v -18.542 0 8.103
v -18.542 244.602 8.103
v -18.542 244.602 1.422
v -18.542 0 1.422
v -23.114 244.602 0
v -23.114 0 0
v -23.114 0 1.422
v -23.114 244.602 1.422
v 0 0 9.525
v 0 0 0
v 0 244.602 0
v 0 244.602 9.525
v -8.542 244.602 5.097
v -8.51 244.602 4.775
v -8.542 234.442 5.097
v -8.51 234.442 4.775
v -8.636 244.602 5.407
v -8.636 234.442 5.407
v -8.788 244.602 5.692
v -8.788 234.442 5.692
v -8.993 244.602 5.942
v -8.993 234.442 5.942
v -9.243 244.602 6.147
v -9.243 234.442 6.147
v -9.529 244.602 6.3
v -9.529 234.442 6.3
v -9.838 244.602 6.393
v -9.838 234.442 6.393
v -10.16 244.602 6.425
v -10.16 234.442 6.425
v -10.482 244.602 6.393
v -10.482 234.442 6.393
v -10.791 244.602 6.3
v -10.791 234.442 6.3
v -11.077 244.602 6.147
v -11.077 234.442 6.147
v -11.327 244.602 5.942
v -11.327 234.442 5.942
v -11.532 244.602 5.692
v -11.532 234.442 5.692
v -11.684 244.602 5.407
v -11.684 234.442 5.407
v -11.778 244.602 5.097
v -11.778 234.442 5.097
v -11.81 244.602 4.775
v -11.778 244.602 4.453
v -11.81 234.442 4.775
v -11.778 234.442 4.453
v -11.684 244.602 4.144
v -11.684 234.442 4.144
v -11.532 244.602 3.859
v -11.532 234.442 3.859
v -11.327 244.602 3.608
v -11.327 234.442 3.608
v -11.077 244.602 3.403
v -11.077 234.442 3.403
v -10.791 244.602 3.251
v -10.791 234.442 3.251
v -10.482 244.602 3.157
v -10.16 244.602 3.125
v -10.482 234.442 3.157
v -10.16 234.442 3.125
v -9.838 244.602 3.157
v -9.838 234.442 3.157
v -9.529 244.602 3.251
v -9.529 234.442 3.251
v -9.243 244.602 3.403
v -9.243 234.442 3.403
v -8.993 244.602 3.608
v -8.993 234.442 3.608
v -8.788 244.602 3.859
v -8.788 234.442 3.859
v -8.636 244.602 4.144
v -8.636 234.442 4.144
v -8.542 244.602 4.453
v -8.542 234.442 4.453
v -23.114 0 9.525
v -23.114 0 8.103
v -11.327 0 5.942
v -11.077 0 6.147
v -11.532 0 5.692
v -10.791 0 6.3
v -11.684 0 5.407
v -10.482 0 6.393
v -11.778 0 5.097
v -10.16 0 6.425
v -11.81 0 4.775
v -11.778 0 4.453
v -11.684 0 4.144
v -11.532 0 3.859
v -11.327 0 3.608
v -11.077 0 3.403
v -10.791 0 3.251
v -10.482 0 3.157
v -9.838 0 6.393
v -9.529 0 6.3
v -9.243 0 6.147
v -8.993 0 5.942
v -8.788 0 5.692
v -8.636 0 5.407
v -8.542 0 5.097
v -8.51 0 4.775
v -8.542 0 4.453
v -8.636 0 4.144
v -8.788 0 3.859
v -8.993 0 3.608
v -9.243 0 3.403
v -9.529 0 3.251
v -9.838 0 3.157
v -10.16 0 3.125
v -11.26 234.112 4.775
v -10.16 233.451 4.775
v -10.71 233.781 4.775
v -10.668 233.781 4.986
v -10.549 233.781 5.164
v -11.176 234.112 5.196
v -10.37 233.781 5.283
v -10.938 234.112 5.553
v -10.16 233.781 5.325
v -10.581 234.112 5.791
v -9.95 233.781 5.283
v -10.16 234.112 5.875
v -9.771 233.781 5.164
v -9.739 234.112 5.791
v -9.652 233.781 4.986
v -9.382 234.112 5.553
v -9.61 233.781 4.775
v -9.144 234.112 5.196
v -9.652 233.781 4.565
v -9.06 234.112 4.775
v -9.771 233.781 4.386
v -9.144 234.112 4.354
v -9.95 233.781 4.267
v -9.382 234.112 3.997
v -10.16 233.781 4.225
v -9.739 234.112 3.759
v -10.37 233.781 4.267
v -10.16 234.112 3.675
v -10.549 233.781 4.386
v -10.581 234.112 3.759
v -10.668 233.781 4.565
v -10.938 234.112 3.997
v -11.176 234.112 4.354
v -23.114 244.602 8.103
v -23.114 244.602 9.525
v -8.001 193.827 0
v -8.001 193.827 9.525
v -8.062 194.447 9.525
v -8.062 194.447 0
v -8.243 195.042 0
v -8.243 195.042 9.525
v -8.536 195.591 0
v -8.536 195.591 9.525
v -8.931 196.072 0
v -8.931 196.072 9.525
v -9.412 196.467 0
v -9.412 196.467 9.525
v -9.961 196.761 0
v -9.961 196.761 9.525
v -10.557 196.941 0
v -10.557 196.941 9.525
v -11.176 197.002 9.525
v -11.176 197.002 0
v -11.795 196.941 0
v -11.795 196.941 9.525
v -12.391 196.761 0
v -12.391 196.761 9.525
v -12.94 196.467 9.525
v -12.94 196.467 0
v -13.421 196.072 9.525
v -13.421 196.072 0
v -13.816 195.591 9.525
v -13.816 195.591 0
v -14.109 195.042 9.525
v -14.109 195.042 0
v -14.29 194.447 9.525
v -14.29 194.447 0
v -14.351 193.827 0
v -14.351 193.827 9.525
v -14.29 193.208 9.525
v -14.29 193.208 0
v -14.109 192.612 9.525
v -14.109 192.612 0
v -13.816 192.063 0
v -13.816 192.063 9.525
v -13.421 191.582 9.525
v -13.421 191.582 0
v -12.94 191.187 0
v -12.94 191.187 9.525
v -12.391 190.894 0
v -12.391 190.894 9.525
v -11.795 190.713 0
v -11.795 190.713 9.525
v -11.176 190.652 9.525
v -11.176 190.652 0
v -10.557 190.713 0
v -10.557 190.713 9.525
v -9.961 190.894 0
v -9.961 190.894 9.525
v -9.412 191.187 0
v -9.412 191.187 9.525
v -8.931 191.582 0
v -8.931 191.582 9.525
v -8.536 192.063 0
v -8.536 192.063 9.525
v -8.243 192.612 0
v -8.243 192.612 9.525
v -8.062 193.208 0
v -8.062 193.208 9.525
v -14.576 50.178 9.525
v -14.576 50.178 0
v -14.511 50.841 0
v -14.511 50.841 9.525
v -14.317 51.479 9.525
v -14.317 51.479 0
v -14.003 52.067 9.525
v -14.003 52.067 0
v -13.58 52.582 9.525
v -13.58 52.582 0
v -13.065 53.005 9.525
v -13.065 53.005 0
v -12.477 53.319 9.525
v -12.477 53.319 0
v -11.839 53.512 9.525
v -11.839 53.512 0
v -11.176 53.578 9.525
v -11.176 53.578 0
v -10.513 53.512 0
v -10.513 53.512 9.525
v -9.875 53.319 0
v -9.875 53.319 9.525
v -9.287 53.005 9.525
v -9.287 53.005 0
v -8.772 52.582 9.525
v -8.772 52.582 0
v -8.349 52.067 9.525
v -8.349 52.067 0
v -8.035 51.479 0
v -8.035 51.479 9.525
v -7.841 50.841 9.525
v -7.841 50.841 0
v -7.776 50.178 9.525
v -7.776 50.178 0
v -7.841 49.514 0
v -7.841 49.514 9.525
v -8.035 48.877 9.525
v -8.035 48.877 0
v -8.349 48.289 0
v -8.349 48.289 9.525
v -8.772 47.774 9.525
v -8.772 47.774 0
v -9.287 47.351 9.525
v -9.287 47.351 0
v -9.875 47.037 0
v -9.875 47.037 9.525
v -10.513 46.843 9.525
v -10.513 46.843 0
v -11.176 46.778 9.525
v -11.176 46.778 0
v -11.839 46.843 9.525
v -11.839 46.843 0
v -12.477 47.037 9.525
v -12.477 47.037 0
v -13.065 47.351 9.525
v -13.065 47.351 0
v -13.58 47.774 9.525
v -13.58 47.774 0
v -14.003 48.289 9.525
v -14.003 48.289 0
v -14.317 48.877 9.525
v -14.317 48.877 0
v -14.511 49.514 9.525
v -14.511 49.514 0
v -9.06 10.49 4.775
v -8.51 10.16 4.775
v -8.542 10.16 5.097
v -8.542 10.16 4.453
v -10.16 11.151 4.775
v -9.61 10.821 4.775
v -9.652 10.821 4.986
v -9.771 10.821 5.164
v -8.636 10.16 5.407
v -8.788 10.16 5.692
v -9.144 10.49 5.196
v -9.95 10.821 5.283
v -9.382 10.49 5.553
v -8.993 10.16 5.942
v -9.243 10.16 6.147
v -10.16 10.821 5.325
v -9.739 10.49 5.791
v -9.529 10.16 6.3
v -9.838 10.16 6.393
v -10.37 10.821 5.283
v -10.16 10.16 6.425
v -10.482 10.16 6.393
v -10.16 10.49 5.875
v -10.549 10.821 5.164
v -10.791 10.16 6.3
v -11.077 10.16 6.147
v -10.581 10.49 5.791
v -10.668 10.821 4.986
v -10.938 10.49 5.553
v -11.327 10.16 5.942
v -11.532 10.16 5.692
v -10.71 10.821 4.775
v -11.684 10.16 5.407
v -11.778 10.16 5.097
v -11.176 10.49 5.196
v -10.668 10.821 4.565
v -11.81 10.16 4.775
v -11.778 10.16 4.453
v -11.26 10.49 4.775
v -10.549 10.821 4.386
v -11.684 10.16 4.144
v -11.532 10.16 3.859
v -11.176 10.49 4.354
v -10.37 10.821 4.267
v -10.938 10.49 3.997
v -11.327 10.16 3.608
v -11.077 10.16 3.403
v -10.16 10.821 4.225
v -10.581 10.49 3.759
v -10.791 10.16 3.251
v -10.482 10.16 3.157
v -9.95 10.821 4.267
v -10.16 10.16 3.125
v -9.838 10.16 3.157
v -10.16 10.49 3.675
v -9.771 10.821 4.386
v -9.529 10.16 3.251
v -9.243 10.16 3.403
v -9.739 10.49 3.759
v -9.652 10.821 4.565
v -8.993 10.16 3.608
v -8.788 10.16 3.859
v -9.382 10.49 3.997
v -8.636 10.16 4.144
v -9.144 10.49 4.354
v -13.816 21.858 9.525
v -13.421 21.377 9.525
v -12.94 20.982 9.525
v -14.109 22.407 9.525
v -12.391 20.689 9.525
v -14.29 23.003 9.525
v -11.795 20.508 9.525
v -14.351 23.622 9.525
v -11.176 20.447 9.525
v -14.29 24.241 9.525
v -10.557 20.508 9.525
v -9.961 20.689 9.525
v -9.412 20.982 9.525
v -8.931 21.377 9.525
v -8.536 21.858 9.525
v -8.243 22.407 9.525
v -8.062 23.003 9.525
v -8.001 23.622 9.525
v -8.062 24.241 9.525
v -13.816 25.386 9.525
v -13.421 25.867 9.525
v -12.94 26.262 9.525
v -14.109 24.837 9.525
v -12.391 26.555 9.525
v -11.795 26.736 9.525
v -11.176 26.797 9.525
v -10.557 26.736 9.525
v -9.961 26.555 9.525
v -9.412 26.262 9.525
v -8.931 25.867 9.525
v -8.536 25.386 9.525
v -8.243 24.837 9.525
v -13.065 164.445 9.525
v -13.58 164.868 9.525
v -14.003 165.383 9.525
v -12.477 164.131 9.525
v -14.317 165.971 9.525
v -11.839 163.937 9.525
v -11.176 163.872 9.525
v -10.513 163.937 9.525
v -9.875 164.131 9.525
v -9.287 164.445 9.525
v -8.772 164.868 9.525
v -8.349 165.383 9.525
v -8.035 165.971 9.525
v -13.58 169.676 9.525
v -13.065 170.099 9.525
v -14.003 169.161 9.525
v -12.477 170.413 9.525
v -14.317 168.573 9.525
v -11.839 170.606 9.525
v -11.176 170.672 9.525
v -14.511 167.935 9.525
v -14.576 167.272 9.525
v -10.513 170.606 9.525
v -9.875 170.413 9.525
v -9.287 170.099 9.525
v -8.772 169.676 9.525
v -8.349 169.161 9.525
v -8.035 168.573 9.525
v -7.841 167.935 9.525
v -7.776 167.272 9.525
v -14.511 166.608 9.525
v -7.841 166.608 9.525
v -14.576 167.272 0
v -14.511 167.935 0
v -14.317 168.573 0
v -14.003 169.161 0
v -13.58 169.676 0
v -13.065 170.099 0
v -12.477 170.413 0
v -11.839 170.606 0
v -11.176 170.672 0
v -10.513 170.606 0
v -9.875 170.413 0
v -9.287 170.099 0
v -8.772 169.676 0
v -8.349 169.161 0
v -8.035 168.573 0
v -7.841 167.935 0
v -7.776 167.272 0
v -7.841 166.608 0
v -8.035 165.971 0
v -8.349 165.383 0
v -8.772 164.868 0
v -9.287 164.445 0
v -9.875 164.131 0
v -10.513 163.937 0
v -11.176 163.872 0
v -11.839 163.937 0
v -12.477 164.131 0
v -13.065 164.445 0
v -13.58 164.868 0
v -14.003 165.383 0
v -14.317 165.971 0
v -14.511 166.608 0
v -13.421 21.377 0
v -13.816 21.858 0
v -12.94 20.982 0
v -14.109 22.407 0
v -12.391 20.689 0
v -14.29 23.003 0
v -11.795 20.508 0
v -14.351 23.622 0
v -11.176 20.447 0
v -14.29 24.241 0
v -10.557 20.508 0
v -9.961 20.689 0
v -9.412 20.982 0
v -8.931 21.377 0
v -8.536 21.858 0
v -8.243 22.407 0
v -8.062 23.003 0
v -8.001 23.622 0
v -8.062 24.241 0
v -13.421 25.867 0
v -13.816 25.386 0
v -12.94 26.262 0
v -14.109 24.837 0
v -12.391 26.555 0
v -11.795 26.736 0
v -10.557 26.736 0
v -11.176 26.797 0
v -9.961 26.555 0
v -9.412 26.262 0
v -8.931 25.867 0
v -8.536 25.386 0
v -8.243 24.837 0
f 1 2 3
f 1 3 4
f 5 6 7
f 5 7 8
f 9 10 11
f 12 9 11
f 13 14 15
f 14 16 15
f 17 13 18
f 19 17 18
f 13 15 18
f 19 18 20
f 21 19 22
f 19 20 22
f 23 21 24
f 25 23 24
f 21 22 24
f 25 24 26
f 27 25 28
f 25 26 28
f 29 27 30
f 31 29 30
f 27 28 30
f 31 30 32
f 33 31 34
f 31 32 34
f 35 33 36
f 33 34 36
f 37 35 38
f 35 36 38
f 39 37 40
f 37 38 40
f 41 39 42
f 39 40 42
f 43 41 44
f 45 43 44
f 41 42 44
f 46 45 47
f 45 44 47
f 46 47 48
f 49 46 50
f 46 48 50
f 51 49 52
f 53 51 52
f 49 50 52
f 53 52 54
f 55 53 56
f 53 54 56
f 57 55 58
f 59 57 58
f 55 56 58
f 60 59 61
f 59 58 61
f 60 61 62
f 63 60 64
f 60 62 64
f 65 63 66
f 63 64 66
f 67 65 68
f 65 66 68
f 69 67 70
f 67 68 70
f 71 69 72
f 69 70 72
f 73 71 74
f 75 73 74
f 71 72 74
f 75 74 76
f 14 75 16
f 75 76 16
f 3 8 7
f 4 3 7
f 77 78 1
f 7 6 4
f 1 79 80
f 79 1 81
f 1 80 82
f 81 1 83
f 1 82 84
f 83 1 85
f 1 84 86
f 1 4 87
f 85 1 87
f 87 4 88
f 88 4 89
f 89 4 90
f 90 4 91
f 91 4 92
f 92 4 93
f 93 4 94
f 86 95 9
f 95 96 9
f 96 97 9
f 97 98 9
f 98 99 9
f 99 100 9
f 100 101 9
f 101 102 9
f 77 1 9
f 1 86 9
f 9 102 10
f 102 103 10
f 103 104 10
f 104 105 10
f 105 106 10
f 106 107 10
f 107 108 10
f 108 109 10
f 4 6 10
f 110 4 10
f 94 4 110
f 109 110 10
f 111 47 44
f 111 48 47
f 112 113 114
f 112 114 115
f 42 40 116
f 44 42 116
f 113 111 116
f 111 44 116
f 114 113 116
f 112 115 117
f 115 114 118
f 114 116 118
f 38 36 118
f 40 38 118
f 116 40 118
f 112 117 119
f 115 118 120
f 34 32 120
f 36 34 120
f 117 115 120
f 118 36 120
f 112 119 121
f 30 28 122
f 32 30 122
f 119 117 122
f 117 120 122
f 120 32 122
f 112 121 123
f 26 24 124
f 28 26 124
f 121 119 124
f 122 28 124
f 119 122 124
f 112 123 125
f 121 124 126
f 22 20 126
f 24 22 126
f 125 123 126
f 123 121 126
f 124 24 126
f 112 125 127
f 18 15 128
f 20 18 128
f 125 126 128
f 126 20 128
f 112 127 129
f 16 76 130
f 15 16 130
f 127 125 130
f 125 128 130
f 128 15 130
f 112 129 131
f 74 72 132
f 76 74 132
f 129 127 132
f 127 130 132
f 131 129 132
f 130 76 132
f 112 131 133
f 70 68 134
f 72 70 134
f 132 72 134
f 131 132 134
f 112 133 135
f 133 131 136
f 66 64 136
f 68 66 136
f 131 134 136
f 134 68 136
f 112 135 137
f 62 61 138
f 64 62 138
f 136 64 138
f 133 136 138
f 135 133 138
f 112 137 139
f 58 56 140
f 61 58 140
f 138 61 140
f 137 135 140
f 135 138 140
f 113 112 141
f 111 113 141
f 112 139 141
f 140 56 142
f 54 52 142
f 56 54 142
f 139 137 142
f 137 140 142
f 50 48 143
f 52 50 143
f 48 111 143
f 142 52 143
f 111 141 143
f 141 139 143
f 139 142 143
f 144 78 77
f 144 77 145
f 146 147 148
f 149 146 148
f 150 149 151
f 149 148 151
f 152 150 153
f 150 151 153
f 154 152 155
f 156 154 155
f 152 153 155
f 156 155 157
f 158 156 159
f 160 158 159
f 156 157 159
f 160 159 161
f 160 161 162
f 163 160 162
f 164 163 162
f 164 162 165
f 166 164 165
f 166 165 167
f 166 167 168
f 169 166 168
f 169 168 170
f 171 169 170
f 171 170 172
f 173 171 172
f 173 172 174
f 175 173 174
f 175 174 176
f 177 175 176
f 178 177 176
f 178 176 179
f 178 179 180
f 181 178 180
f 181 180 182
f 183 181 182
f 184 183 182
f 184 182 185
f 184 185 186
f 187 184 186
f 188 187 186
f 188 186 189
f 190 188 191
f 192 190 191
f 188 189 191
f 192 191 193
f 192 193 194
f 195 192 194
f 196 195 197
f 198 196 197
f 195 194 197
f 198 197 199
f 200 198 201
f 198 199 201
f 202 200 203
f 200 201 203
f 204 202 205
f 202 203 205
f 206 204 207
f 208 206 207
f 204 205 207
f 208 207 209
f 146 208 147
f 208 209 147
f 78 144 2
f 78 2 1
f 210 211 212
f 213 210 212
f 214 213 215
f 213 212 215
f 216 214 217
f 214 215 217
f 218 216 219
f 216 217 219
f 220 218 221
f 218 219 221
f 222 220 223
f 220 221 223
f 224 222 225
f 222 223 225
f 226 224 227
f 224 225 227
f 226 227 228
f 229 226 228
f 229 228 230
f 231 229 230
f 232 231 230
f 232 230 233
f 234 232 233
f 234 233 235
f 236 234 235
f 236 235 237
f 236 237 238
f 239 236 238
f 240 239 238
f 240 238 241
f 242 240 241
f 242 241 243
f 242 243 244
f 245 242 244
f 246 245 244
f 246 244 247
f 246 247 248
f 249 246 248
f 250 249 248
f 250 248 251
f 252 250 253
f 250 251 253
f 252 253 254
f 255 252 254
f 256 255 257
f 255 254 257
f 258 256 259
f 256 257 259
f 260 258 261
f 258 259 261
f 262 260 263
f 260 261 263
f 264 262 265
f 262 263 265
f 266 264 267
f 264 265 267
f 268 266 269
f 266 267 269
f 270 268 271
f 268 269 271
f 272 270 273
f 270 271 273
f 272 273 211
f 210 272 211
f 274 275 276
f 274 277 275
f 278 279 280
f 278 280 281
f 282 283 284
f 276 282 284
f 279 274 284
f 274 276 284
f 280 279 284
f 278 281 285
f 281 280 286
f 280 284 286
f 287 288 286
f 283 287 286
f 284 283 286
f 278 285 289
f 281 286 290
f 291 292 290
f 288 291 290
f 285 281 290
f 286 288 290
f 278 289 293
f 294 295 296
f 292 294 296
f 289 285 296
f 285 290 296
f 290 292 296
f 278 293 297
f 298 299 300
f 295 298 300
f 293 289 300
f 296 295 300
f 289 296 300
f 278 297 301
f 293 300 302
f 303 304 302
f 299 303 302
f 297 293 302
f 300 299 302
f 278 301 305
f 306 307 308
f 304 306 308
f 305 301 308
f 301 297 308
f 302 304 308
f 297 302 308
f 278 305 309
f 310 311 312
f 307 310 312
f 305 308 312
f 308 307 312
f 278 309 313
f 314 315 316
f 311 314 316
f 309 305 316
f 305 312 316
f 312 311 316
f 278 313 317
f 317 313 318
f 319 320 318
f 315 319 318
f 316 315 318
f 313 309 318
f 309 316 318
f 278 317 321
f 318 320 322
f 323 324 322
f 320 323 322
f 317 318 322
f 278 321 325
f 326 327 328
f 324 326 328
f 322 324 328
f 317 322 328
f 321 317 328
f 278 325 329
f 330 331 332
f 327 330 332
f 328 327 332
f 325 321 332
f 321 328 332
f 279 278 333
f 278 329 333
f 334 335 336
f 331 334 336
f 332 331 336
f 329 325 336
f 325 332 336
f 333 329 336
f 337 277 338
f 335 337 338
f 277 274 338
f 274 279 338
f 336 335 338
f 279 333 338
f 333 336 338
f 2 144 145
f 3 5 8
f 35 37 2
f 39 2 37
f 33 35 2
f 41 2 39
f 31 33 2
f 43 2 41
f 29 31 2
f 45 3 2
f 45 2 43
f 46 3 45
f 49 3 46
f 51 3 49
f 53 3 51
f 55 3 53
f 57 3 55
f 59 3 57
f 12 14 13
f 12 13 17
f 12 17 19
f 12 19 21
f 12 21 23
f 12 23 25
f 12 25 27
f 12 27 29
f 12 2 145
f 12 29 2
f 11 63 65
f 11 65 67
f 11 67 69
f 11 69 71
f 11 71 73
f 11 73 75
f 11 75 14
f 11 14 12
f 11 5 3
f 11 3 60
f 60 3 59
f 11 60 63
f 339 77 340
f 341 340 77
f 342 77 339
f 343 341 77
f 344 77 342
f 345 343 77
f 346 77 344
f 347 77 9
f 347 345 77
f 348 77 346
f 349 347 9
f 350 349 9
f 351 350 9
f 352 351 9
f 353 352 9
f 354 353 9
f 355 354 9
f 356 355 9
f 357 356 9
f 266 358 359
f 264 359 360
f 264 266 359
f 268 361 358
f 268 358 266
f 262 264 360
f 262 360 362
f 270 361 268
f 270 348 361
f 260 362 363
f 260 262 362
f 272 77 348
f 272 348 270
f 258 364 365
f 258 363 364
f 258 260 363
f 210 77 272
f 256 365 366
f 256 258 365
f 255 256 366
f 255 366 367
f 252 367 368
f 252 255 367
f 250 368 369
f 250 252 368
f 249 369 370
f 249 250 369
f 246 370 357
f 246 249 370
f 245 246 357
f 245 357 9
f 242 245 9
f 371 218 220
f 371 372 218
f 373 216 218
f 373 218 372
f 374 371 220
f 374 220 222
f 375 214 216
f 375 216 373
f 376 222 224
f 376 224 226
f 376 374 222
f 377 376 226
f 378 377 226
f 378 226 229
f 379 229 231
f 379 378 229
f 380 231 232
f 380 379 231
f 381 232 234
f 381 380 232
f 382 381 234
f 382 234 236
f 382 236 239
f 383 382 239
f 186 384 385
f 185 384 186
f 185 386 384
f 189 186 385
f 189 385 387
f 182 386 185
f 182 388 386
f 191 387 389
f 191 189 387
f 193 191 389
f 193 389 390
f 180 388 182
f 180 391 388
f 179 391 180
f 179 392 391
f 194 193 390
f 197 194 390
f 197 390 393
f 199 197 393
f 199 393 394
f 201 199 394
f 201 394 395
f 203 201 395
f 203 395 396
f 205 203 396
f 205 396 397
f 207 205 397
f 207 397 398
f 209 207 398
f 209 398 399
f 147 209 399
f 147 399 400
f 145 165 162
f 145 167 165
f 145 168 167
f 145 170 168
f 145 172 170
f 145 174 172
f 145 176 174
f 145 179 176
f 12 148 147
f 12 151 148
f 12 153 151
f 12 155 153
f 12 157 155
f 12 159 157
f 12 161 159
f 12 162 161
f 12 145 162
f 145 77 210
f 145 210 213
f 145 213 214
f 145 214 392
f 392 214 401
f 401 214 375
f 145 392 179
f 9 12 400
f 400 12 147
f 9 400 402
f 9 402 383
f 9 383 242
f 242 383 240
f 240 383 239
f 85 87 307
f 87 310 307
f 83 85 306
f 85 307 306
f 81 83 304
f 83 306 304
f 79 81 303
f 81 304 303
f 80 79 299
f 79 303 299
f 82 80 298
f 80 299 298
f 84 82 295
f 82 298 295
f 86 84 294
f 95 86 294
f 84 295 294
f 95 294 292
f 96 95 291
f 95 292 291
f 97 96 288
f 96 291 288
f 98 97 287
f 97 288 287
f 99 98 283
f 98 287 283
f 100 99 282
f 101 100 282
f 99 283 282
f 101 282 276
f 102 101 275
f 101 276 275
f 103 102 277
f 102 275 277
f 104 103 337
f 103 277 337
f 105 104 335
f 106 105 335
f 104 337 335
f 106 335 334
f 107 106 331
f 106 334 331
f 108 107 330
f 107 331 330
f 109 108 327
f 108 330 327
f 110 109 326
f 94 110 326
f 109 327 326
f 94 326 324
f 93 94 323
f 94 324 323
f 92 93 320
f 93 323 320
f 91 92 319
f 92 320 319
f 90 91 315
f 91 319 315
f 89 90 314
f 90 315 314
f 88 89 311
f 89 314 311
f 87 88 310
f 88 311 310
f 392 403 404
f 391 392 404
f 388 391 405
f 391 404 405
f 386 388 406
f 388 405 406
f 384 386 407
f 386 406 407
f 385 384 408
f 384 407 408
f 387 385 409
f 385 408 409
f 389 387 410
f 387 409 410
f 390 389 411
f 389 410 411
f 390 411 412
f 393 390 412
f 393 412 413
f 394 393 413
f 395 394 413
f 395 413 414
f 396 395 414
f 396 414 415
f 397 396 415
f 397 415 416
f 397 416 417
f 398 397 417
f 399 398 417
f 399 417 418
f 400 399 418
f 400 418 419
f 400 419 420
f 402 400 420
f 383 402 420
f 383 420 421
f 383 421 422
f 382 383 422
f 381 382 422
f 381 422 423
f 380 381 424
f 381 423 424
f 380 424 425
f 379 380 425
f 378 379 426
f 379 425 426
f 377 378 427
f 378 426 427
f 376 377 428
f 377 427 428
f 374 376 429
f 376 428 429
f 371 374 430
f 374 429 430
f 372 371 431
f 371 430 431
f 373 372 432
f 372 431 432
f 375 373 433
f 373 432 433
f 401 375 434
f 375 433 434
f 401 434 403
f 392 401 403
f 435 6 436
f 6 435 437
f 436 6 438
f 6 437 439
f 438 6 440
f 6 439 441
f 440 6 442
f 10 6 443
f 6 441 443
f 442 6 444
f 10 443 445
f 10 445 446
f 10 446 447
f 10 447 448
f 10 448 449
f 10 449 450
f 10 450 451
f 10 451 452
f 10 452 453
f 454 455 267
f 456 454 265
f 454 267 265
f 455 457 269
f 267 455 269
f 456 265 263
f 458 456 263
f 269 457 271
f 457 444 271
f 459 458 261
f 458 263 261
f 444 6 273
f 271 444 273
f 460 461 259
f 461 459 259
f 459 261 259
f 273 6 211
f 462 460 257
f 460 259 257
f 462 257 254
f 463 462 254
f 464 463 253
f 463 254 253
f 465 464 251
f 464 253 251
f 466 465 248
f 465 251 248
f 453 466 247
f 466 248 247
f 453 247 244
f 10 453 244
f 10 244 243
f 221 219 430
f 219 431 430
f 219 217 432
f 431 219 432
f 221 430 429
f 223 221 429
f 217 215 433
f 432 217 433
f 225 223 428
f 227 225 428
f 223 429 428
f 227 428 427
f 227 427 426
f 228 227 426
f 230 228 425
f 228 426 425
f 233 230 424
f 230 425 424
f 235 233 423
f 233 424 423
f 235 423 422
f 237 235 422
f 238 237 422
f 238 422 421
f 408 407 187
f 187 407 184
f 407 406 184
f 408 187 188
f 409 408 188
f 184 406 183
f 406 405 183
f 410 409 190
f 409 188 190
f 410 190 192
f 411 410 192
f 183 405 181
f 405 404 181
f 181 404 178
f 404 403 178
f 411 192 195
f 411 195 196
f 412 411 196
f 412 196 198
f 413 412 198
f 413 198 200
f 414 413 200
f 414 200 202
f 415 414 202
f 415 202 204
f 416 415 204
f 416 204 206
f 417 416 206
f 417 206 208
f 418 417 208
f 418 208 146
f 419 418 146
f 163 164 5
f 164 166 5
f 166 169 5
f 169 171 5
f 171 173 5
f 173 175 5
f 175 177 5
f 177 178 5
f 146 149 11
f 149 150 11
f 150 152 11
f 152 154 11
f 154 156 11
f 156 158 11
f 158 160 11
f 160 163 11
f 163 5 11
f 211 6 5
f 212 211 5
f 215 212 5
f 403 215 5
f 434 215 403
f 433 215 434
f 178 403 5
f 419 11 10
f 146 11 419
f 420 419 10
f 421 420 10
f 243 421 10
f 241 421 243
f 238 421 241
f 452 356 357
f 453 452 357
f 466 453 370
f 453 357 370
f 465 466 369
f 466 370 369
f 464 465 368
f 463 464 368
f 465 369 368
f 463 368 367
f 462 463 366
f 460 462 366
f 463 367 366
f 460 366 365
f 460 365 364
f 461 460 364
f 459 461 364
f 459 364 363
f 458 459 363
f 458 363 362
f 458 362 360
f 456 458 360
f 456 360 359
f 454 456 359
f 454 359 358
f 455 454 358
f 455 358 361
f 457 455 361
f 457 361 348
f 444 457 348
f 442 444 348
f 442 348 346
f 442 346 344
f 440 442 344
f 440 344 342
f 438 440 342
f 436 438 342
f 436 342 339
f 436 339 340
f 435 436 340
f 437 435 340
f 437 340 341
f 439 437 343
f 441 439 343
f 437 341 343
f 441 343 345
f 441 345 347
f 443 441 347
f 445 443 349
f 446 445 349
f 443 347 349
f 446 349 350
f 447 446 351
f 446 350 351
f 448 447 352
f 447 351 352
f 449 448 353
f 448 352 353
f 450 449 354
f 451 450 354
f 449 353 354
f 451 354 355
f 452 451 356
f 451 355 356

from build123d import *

# Parameters (mm, degrees)
F0_W     = 23.114
F0_H     = 244.602
F1_DEPTH = 9.525
F2_W     = 244.602
F2_H     = 6.6802
F3_DEPTH = 4.572
F4_R     = 3.175
F5_DEPTH = 9.526
F8_D     = 3.3
F8_DEPTH = 10.16
F8_TIP   = 0.9914200214
F9_D     = 3.3
F9_DEPTH = 10.16
F9_TIP   = 0.9914200214
F11_D    = 6.8


with BuildPart() as f1:
    # F0 (on Top) → F1 (new body)
    with BuildSketch(Plane.XY):
        with Locations((-11.557, 122.301)):
            Rectangle(F0_W, F0_H)
    extrude(amount=F1_DEPTH)

    # F2 (on face) → F3 (cut)
    with BuildSketch(Plane(origin=(-23.114, 0, 0), x_dir=(0, -1, 0), z_dir=(-1, 0, 0))):
        with Locations((-122.301, 4.7625)):
            Rectangle(F2_W, F2_H)
    extrude(amount=-F3_DEPTH, mode=Mode.SUBTRACT)

    # F4 (on face) → F5 (cut, through all)
    with BuildSketch(Plane.XY.offset(9.525)):
        with Locations((-11.176, 23.622)):
            Circle(F4_R)
        with Locations((-11.176, 193.8274)):
            Circle(F4_R)
    extrude(amount=-F5_DEPTH, mode=Mode.SUBTRACT)

    # F8
    with Locations(Plane(origin=(0, 244.602, 0), x_dir=(-1, 0, 0), z_dir=(0, 1, 0))):
        with Locations((10.16, 4.7752)):
            Hole(F8_D / 2, depth=F8_DEPTH)
            with Locations((0, 0, -(F8_DEPTH + F8_TIP / 2))):  # 118° drill point
                Cone(0, F8_D / 2, F8_TIP, mode=Mode.SUBTRACT)

    # F9
    with Locations(Plane.XZ):
        with Locations((-10.16, 4.7752)):
            Hole(F9_D / 2, depth=F9_DEPTH)
            with Locations((0, 0, -(F9_DEPTH + F9_TIP / 2))):  # 118° drill point
                Cone(0, F9_D / 2, F9_TIP, mode=Mode.SUBTRACT)

    # F11 (through all)
    with Locations(Plane.XY.offset(9.525)):
        with Locations((-11.176, 167.2717), (-11.176, 50.1777)):
            Hole(F11_D / 2)


solid = f1.part
